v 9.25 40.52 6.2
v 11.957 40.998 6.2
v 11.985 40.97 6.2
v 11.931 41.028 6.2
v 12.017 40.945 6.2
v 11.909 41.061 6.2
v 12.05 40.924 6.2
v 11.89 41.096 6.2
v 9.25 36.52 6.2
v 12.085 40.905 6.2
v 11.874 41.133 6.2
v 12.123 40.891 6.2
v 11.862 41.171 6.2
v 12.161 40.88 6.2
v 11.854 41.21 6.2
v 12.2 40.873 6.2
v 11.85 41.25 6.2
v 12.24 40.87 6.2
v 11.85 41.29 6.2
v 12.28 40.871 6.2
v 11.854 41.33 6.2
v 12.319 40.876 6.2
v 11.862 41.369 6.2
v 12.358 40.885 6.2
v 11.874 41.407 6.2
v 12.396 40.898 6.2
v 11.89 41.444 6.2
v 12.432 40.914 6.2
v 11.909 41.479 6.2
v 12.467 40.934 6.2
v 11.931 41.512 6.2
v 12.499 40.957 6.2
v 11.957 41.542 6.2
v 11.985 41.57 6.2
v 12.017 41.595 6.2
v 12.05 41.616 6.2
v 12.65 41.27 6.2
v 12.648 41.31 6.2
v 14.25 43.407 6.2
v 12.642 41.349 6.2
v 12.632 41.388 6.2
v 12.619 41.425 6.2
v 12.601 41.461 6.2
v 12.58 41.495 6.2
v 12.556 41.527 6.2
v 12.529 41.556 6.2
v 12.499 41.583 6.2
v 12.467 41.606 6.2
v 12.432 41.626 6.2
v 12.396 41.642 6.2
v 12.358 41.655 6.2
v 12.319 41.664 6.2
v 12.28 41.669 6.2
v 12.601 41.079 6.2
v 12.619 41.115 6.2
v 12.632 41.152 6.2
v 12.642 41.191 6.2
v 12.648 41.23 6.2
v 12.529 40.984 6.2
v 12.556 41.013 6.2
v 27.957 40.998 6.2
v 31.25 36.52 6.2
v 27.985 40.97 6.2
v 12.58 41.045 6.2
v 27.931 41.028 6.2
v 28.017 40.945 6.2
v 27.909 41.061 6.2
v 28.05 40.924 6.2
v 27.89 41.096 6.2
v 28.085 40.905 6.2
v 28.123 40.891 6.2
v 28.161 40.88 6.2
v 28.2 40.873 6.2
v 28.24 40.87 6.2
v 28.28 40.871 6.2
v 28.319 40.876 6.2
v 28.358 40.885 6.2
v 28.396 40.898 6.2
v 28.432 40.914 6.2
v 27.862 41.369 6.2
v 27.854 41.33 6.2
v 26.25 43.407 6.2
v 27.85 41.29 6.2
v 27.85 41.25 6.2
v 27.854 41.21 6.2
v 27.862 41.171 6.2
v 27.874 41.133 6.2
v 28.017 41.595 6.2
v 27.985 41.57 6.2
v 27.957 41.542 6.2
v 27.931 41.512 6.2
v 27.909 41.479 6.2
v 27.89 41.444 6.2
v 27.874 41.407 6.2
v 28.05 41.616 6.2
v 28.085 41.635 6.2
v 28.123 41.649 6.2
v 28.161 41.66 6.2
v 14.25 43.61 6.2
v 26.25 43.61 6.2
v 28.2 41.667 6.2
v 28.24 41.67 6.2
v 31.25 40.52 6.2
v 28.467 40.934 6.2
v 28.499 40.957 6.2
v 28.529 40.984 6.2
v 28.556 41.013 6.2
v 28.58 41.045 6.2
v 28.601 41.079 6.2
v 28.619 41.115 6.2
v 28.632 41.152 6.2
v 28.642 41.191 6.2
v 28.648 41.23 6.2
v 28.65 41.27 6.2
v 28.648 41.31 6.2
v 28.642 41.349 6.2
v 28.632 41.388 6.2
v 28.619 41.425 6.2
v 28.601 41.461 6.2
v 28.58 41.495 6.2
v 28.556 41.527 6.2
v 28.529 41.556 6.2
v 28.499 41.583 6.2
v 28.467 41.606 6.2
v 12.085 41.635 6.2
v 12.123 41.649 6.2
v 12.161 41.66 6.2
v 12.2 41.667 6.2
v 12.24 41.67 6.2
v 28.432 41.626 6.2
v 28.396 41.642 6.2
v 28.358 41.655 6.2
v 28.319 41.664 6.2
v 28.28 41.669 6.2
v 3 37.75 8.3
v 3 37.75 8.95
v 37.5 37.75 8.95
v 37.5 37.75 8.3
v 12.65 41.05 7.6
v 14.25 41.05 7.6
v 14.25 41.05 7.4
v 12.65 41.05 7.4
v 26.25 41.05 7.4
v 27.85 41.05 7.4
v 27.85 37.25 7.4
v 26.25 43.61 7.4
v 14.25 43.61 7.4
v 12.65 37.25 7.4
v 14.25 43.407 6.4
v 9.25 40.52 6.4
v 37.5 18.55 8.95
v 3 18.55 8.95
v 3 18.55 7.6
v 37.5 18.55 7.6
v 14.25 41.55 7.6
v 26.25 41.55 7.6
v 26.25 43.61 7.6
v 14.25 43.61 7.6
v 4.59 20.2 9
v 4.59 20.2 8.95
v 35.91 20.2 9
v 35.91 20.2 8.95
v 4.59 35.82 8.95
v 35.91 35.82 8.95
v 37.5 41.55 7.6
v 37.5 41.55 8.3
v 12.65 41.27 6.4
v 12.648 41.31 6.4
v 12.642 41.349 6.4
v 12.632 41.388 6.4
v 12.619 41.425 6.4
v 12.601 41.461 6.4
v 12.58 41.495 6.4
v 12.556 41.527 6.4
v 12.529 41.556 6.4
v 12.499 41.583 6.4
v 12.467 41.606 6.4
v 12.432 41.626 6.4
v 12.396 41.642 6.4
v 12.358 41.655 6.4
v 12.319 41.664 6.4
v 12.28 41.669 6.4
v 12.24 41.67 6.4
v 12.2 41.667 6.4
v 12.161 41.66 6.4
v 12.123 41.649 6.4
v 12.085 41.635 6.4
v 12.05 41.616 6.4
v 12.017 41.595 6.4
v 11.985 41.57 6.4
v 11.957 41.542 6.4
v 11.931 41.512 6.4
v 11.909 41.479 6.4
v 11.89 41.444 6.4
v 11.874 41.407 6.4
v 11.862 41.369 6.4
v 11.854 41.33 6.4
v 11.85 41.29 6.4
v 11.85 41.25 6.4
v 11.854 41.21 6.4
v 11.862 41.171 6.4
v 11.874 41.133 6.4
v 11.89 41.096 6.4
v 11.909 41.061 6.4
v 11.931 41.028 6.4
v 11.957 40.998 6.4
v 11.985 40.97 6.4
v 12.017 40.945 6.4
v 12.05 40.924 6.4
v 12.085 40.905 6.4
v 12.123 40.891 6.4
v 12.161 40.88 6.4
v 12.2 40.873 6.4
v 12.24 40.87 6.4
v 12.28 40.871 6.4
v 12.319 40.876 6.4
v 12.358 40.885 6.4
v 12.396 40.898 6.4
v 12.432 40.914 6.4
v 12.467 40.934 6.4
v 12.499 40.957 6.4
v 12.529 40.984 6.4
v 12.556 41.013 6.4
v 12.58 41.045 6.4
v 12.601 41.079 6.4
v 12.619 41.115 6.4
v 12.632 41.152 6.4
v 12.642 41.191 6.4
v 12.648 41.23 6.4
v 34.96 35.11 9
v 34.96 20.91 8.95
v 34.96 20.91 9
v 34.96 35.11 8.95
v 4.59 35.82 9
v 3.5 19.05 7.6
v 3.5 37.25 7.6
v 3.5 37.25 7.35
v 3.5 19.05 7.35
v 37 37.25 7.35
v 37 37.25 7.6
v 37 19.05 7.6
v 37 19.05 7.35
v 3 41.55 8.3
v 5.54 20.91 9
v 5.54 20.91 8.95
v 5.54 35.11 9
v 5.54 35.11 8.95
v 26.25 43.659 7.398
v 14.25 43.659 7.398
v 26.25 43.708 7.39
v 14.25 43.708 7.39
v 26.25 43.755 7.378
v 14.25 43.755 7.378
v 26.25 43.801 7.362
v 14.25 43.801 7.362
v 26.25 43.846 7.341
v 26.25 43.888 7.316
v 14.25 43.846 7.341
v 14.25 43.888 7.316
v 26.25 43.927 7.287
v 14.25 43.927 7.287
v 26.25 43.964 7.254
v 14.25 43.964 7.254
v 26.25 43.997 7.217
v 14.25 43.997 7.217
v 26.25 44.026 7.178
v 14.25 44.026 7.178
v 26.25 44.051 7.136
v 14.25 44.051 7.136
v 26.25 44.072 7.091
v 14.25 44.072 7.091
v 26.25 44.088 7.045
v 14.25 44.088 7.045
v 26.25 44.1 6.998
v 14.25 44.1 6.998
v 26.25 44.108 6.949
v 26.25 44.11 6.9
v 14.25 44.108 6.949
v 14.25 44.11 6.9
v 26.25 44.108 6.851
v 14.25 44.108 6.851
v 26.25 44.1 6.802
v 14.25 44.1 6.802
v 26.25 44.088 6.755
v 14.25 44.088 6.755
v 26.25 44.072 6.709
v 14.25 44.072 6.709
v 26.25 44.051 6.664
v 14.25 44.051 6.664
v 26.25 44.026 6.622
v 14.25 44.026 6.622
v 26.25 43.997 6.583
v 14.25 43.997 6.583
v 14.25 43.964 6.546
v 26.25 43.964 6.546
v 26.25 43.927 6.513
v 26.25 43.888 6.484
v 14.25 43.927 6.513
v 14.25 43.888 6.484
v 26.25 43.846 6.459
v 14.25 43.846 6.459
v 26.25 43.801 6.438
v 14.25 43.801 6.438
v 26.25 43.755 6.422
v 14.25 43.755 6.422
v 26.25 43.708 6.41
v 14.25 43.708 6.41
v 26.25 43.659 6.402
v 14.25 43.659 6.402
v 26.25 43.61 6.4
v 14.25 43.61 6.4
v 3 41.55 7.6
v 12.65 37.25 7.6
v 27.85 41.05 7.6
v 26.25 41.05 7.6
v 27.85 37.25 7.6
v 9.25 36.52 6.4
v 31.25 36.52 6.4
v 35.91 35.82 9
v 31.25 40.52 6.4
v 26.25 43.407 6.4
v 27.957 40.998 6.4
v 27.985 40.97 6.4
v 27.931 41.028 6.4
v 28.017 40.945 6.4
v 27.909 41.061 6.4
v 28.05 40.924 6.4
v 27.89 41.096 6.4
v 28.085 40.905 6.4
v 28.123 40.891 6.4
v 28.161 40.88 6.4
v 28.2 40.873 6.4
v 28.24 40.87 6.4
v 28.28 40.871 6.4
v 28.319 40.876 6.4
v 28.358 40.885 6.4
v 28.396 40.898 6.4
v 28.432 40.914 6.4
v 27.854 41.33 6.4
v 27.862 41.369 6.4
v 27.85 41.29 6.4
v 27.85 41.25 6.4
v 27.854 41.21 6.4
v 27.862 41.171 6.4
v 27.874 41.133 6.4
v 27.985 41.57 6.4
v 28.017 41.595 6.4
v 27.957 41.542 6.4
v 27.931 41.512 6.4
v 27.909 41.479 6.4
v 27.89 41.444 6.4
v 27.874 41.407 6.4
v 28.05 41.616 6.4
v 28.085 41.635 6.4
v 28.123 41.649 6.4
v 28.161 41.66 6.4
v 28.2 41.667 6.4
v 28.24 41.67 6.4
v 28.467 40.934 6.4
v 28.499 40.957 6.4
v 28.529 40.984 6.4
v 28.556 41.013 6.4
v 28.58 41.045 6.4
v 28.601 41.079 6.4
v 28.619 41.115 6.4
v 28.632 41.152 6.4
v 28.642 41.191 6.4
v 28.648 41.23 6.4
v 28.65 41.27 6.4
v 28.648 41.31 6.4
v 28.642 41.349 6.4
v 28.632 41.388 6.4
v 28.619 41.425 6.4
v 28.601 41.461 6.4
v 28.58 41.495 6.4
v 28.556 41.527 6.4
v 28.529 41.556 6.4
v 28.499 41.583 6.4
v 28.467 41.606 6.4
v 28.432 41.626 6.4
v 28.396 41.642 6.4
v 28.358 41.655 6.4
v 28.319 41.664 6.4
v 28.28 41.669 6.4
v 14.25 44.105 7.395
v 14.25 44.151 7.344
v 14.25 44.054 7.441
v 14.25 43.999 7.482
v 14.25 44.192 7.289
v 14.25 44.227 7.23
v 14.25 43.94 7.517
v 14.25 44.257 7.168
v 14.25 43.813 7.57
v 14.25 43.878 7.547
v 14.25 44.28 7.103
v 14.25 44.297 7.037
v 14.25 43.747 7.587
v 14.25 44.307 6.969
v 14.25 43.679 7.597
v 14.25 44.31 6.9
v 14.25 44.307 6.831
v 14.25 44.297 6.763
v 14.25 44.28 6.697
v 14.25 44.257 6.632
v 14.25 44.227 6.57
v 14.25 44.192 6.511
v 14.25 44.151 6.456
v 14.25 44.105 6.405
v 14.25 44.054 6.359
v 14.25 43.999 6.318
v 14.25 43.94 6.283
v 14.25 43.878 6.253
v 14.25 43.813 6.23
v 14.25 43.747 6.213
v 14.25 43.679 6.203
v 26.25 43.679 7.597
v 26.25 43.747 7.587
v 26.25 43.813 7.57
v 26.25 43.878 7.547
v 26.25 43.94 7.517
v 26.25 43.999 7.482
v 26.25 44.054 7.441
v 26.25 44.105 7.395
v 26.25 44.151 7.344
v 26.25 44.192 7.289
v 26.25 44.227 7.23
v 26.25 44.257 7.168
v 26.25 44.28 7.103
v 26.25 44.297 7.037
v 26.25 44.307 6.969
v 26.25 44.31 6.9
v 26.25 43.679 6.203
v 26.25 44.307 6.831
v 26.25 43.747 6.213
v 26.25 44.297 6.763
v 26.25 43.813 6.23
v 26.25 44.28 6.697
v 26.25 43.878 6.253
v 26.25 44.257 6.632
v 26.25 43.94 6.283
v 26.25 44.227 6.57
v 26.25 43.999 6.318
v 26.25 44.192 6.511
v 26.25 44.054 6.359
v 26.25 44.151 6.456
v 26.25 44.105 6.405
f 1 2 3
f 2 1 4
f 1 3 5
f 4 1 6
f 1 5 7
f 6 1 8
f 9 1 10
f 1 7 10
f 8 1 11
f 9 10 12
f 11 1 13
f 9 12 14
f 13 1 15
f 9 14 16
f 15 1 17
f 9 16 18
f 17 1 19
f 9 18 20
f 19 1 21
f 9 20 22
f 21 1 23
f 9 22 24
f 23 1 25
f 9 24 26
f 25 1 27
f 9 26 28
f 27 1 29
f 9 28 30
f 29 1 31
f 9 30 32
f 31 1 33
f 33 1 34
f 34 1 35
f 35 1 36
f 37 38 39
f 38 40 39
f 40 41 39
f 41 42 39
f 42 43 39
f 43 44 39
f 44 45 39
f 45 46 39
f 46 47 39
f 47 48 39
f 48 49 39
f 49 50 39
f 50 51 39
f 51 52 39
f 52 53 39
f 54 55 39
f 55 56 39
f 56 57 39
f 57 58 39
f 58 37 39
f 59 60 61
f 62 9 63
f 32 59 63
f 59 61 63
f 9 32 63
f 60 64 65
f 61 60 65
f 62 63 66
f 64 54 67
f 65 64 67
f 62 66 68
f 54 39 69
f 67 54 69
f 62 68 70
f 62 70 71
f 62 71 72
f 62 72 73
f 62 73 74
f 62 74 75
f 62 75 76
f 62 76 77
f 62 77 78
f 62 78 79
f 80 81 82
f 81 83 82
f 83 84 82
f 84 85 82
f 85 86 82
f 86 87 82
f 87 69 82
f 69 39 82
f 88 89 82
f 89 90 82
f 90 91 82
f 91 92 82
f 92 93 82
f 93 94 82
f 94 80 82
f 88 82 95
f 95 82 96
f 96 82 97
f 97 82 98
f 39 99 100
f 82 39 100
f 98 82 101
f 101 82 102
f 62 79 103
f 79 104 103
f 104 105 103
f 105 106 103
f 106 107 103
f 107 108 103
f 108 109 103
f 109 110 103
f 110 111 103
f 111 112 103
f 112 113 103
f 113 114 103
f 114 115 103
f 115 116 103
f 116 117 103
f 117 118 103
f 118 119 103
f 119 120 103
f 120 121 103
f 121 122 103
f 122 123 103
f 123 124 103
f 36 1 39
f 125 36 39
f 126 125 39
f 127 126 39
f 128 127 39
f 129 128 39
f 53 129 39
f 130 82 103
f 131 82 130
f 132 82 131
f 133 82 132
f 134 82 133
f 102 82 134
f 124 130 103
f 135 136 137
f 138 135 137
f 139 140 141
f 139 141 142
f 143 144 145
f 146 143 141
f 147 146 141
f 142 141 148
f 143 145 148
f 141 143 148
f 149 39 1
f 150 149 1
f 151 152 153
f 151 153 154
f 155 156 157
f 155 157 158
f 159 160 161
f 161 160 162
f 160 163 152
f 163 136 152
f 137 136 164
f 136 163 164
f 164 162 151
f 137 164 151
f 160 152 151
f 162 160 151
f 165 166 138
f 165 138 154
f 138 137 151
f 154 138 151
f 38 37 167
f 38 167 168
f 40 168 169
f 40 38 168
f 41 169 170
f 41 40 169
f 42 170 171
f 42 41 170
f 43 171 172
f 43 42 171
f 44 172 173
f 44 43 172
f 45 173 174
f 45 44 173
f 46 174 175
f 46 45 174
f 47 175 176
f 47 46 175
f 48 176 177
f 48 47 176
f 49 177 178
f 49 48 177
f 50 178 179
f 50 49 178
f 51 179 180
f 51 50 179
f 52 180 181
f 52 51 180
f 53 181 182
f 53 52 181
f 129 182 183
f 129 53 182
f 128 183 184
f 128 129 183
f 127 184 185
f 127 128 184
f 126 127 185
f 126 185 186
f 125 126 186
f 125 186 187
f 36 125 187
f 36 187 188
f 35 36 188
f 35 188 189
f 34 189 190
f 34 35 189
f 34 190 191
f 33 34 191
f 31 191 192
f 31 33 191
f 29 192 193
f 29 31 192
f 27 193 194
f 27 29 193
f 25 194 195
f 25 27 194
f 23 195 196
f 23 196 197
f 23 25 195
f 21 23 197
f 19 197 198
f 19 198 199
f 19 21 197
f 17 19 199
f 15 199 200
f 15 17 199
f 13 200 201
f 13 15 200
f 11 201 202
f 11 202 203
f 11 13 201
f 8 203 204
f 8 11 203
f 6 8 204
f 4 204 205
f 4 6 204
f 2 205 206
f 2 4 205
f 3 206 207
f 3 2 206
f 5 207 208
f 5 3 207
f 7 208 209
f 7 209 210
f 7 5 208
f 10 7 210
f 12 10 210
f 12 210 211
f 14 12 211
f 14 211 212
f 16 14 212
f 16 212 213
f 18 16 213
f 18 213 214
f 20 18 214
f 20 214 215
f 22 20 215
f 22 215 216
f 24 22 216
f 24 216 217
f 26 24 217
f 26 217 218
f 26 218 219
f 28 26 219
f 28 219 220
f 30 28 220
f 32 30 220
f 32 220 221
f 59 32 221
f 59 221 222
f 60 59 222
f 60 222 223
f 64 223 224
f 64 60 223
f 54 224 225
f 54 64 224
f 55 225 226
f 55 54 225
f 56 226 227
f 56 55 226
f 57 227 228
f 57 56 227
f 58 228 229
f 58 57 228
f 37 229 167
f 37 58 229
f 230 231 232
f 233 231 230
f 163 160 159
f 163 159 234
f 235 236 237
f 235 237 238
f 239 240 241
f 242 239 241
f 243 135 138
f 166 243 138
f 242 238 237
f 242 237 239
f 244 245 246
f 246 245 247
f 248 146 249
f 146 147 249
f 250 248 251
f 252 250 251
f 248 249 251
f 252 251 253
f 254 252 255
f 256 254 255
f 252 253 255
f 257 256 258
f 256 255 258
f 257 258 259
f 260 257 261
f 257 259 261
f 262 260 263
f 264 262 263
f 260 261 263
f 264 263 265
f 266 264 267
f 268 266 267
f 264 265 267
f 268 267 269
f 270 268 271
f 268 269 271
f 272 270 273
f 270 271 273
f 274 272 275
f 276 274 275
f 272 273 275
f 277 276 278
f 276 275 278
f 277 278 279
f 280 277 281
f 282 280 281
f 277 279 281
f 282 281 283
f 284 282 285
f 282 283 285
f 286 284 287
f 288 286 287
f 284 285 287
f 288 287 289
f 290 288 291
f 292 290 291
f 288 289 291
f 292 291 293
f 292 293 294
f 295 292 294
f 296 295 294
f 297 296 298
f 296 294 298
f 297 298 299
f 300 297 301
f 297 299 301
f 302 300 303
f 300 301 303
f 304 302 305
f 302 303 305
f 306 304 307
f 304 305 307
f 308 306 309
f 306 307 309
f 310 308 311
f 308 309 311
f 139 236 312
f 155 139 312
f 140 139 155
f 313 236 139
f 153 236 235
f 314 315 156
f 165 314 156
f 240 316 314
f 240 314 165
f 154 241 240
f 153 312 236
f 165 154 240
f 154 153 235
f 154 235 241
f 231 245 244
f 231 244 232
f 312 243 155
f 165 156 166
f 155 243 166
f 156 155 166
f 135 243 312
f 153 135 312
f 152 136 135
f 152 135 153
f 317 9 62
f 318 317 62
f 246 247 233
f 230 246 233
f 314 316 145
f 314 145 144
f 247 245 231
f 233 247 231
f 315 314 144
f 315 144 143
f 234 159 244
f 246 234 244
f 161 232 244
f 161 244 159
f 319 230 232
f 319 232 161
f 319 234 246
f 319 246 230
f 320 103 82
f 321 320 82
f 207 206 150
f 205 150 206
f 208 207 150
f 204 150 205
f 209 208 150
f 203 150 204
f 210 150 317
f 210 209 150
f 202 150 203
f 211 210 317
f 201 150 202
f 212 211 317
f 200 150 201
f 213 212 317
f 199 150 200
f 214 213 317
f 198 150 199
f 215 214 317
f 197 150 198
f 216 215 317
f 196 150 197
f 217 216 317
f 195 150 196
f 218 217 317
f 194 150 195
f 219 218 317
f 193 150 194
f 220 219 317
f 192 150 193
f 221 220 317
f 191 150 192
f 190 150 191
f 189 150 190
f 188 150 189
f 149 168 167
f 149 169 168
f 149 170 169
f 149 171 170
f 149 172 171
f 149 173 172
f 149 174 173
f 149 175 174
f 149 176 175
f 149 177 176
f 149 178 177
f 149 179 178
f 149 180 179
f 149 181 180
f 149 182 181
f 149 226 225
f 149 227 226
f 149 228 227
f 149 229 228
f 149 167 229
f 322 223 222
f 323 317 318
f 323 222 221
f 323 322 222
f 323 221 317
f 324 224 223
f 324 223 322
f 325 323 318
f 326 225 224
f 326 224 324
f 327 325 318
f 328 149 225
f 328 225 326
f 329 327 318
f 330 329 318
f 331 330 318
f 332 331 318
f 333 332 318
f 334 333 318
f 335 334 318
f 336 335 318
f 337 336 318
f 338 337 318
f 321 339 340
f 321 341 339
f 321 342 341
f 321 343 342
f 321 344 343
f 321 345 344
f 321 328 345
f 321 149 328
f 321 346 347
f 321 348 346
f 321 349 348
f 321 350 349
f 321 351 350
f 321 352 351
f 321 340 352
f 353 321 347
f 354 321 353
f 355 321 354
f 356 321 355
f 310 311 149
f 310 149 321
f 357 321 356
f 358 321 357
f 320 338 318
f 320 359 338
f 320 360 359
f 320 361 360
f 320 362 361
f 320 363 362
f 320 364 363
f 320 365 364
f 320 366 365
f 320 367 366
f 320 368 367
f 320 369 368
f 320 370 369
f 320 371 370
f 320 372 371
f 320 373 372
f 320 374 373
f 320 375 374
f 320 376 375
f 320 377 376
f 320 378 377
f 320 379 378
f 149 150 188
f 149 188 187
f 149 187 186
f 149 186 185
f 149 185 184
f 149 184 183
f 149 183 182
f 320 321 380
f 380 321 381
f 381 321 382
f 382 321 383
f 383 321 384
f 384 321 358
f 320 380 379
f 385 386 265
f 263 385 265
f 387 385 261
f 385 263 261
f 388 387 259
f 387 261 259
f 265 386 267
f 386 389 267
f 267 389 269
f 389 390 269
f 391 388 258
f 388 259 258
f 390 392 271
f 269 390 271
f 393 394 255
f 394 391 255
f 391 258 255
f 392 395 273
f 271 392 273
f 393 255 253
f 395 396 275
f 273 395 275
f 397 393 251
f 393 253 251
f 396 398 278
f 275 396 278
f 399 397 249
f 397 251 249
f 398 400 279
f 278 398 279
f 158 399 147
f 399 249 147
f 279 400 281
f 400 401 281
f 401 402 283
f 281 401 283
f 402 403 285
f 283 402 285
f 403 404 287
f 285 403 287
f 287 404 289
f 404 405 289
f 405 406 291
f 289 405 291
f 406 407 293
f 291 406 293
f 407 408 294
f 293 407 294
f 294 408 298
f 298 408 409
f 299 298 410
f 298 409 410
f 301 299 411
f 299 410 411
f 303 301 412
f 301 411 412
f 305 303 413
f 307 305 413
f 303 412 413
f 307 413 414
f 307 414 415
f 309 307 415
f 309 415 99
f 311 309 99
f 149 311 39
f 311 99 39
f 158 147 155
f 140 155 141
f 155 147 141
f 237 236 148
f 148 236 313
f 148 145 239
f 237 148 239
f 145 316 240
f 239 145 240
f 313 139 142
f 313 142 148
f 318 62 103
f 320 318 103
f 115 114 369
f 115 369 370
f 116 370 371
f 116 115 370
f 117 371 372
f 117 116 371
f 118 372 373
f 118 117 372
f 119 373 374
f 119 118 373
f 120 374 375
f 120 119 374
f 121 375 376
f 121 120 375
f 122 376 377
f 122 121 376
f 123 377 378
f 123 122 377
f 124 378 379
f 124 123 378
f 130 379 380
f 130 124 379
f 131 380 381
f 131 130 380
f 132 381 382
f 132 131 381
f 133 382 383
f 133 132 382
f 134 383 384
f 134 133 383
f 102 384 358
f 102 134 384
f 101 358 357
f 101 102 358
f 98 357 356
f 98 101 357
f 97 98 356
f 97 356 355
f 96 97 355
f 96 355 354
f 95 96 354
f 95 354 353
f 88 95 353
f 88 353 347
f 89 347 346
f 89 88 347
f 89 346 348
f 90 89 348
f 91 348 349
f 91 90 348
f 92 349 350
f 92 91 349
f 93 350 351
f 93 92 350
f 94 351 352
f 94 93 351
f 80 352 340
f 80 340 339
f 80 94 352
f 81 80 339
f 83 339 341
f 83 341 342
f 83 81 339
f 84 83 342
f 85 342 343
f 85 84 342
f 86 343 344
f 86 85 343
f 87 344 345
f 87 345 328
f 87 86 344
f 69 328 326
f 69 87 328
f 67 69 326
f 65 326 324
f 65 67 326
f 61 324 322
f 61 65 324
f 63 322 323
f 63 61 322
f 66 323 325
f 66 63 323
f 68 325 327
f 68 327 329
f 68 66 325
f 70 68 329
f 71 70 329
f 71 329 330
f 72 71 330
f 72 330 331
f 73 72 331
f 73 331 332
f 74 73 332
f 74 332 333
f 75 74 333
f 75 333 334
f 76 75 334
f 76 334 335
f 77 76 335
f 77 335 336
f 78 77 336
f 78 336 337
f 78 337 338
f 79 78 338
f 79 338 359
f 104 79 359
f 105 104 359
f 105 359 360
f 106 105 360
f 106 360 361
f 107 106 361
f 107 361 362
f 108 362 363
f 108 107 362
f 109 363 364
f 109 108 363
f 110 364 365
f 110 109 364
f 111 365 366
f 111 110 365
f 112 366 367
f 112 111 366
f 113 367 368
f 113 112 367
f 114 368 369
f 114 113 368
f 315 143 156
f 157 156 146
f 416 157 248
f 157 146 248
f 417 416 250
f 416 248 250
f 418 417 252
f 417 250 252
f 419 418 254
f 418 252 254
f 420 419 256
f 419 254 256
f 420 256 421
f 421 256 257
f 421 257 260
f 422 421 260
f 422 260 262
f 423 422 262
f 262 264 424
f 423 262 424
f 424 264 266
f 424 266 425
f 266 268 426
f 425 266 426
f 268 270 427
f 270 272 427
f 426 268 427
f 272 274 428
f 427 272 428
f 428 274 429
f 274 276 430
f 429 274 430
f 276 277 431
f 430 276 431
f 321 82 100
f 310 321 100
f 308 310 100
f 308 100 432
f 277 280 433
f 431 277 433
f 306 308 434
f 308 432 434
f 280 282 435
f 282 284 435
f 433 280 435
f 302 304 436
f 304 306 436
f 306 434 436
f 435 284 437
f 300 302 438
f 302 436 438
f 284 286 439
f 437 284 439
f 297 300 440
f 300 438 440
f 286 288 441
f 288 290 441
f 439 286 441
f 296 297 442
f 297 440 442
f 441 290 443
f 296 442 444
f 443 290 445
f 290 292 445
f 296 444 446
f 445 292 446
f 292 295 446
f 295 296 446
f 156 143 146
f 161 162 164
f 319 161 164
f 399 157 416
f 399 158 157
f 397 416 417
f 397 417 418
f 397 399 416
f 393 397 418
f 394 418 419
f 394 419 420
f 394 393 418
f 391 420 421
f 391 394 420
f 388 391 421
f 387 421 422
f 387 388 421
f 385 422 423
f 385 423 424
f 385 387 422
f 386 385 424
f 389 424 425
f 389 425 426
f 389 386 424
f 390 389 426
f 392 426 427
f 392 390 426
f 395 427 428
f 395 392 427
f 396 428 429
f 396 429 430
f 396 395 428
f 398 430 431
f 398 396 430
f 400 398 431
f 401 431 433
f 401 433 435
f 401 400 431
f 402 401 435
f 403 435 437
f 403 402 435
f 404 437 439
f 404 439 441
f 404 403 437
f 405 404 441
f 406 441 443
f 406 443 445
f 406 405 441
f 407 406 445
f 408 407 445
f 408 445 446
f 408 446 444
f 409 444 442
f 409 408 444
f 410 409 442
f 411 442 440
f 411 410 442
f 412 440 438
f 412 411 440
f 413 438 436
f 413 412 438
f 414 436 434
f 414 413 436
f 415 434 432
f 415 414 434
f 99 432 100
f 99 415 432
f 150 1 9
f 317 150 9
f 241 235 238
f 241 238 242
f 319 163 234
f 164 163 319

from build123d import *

# Parameters (mm, degrees)
SKETCH030_W      = 34.5
SKETCH030_H      = 19.2
PAD018_DEPTH     = 0.65
SKETCH031_W      = 31.32
SKETCH031_H      = 15.62
SKETCH031_W_2    = 29.42
SKETCH031_H_2    = 14.2
PAD019_DEPTH     = 0.05
SKETCH032_W      = 34.5
SKETCH032_H      = 23
PAD020_DEPTH     = 0.7
SKETCH033_W      = 33.5
SKETCH033_H      = 18.2
PAD021_DEPTH     = 0.25
PAD024_DEPTH     = 0.2
SKETCH038_W      = 12
SKETCH038_H      = 0.2
REVOLUTION_ANGLE = 180
SKETCH039_R      = 0.4
PAD025_DEPTH     = 0.2


with BuildPart() as part:
    # Sketch030 (on Face1 of CopyPad017) → Pad018 (new body)
    with BuildSketch(Plane(origin=(0, 0, 8.95), x_dir=(1, 0, 0), z_dir=(0, 0, -1))):
        with Locations((20.25, -28.15)):
            Rectangle(SKETCH030_W, SKETCH030_H)
    extrude(amount=PAD018_DEPTH)

    # Sketch031 (on Face5 of Pad018) → Pad019 (join)
    with BuildSketch(Plane.XY.offset(8.95)):
        with Locations((20.25, 28.01)):
            Rectangle(SKETCH031_W, SKETCH031_H)
        with Locations((20.25, 28.01)):
            Rectangle(SKETCH031_W_2, SKETCH031_H_2, mode=Mode.SUBTRACT)
    extrude(amount=PAD019_DEPTH)

    # Sketch032 (on Face5 of Pad019) → Pad020 (join)
    with BuildSketch(Plane(origin=(0, 0, 8.3), x_dir=(1, 0, 0), z_dir=(0, 0, -1))):
        with Locations((20.25, -30.05)):
            Rectangle(SKETCH032_W, SKETCH032_H)
    extrude(amount=PAD020_DEPTH)

    # Sketch033 (on Face13 of Pad020) → Pad021 (join)
    with BuildSketch(Plane(origin=(0, 0, 7.6), x_dir=(1, 0, 0), z_dir=(0, 0, -1))):
        with Locations((20.25, -28.15)):
            Rectangle(SKETCH033_W, SKETCH033_H)
    extrude(amount=PAD021_DEPTH)

    # Sketch037 (on Face13 of Pad021) → Pad024 (join)
    with BuildSketch(Plane(origin=(0, 0, 7.6), x_dir=(1, 0, 0), z_dir=(0, 0, -1))):
        Polygon((12.65, -37.25), (27.85, -37.25), (27.85, -41.05), (26.25, -41.05), (26.25, -43.61), (14.25, -43.61), (14.25, -41.05), (12.65, -41.05), align=None)
    extrude(amount=PAD024_DEPTH)

    # Sketch038 (on Face32 of Pad024) → Revolution (revolve)
    with BuildSketch(Plane(origin=(0, 43.61, 0), x_dir=(-1, 0, 0), z_dir=(0, 1, 0))):
        with Locations((-20.25, 7.5)):
            Rectangle(SKETCH038_W, SKETCH038_H)
    revolve(axis=Axis((26.262199, 43.61, 6.9), (-1, 0, 0)), revolution_arc=REVOLUTION_ANGLE)

    # Sketch039 (on Face27 of Revolution) → Pad025 (join)
    with BuildSketch(Plane.XY.offset(6.2)):
        Polygon((14.25, 43.61), (14.25, 43.406751), (9.25, 40.52), (9.25, 36.52), (31.25, 36.52), (31.25, 40.52), (26.25, 43.406751), (26.25, 43.61), align=None)
        with Locations((12.25, 41.27)):
            Circle(SKETCH039_R, mode=Mode.SUBTRACT)
        with Locations((28.25, 41.27)):
            Circle(SKETCH039_R, mode=Mode.SUBTRACT)
    extrude(amount=PAD025_DEPTH)


solid = part.part
